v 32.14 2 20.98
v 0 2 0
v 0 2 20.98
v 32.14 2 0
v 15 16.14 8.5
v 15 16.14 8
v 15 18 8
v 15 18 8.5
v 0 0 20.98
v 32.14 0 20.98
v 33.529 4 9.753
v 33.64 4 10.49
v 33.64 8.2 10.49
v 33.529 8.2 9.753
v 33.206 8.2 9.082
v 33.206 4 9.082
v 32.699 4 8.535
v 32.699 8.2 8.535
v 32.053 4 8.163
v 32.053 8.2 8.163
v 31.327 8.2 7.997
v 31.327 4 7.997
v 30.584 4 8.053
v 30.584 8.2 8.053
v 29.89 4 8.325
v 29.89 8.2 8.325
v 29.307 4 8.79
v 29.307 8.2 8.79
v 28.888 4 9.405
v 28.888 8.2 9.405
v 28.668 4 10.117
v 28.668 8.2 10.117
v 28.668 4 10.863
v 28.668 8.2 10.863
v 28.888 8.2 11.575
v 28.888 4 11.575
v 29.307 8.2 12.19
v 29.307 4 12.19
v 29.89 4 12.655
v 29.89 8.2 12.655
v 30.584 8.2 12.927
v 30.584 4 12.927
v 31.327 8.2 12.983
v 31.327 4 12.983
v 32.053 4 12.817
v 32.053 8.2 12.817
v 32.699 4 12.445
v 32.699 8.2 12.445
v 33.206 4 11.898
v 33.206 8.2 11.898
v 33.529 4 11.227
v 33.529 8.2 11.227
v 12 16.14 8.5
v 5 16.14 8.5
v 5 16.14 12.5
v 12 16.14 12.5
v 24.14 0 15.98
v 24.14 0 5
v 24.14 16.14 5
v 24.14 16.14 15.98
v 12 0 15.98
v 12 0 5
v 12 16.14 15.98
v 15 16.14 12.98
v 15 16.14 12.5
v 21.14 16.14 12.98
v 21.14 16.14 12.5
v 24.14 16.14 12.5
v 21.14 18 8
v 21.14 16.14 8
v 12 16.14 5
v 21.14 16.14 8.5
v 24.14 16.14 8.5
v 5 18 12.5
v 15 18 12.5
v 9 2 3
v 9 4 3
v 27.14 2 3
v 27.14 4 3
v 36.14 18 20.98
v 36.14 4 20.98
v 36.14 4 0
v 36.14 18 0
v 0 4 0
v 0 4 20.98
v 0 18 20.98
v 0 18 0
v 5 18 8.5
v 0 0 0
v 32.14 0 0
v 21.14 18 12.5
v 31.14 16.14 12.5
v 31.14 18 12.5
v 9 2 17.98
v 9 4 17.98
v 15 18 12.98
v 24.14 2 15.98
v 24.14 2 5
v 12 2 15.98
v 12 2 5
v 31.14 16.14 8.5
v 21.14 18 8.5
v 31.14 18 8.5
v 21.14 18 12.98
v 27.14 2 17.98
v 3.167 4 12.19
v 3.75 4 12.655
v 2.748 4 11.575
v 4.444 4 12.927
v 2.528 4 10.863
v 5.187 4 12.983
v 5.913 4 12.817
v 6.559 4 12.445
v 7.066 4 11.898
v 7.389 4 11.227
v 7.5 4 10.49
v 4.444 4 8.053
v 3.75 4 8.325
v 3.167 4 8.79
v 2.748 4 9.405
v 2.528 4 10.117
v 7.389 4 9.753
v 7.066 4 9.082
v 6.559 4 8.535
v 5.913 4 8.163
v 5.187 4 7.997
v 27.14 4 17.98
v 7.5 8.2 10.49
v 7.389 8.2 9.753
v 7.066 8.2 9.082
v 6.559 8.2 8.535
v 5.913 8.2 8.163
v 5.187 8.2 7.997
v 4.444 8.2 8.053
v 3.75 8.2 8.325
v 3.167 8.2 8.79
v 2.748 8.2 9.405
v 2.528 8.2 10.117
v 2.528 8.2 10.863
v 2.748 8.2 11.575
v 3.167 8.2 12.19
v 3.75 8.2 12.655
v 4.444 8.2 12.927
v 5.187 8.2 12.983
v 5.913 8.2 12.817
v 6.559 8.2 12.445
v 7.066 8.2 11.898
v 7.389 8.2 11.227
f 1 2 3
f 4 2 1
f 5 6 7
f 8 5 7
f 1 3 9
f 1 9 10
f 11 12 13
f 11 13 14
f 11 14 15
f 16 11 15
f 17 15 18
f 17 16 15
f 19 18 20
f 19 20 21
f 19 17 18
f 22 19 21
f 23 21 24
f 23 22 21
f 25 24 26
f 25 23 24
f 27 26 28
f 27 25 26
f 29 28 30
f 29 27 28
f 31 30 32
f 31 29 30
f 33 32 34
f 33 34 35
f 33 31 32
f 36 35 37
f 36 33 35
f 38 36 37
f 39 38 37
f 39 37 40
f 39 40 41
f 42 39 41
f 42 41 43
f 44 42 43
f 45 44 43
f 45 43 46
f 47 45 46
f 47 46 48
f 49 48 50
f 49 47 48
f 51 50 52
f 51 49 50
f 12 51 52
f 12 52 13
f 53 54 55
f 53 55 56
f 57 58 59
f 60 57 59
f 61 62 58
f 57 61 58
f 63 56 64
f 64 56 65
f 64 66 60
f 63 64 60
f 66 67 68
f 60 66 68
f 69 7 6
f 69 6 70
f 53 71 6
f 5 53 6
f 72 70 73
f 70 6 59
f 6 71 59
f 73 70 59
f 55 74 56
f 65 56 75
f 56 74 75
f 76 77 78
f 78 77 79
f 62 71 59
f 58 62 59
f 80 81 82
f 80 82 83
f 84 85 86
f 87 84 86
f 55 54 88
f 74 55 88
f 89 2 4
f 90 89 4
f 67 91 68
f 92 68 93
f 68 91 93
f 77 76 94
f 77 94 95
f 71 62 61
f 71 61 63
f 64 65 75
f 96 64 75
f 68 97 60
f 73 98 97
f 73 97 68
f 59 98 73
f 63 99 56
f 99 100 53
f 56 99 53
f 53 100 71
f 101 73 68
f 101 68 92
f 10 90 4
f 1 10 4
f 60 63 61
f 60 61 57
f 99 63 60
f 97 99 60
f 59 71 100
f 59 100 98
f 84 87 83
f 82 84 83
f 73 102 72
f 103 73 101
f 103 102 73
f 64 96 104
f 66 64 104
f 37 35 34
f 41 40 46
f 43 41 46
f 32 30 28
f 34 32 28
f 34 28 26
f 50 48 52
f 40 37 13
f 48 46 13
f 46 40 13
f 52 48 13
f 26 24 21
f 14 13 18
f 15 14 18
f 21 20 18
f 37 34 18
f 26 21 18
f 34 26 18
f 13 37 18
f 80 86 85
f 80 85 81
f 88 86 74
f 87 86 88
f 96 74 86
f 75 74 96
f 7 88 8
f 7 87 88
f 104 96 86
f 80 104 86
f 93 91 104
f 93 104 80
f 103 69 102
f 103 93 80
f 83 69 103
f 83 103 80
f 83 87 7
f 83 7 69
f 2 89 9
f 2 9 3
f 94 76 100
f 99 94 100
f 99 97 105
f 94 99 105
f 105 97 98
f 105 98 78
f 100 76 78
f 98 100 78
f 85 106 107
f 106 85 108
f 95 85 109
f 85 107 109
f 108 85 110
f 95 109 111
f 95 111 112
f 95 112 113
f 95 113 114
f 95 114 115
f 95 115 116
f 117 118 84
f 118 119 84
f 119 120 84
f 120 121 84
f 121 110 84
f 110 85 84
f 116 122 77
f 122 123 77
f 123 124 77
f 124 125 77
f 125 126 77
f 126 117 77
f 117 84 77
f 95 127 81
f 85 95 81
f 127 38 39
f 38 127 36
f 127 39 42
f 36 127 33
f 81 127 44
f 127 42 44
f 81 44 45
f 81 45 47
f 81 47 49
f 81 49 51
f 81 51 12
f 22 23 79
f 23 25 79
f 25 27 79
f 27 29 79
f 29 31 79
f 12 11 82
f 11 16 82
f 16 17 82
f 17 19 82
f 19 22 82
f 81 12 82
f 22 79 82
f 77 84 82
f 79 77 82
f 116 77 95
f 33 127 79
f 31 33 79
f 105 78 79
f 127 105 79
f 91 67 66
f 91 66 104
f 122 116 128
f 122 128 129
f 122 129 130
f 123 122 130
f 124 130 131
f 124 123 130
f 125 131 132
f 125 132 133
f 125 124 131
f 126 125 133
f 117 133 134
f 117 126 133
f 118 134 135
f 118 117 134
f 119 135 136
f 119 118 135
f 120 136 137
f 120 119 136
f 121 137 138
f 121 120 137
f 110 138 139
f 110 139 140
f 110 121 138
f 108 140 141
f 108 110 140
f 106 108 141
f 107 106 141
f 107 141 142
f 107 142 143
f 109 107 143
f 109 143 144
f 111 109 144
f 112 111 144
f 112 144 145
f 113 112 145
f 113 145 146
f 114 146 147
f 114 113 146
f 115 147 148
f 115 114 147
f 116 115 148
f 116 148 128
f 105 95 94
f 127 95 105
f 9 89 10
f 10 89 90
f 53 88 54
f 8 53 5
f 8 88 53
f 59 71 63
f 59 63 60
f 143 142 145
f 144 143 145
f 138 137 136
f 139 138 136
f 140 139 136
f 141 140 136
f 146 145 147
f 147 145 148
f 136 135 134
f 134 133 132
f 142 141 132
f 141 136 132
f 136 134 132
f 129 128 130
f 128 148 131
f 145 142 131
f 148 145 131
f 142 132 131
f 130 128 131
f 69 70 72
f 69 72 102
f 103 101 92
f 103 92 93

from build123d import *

# Parameters (mm, degrees)
BOX_W             = 12.14
BOX_H             = 16.14
BOX_DEPTH         = 10.98
BOX001_W          = 32.14
BOX001_H          = 2
BOX001_DEPTH      = 20.98
CYLINDER001_R     = 2.5
CYLINDER001_DEPTH = 4.2
CYLINDER_R        = 2.5
CYLINDER_DEPTH    = 4.2
BOX007_W          = 18.14
BOX007_H          = 4
BOX007_DEPTH      = 14.98
BOX006_W          = 36.14
BOX006_H          = 4
BOX006_DEPTH      = 20.98
BOX004_W          = 26.14
BOX004_H          = 10
BOX004_DEPTH      = 4
BOX003_W          = 6.14
BOX003_H          = 10
BOX003_DEPTH      = 4.98
BOX005_W          = 12.14
BOX005_H          = 16.14
BOX005_DEPTH      = 10.98
BOX002_W          = 36.14
BOX002_H          = 16
BOX002_DEPTH      = 20.98


with BuildPart() as usb:
    # Box → Box (new body)
    with BuildSketch(Plane(origin=(12, 0, 5), x_dir=(1, 0, 0), z_dir=(0, 0, 1))):
        with Locations((6.07, 8.07)):
            Rectangle(BOX_W, BOX_H)
    extrude(amount=BOX_DEPTH)


with BuildPart() as panel:
    # Box001 → Box001 (new body)
    with BuildSketch(Plane.XY):
        with Locations((16.07, 1)):
            Rectangle(BOX001_W, BOX001_H)
    extrude(amount=BOX001_DEPTH)


with BuildPart() as cylinder001:
    # Cylinder001 → Cylinder001 (new body)
    with BuildSketch(Plane(origin=(31.14, 4, 10.49), x_dir=(1, 0, 0), z_dir=(0, 1, 0))):
        Circle(CYLINDER001_R)
    extrude(amount=CYLINDER001_DEPTH)


with BuildPart() as cylinder:
    # Cylinder → Cylinder (new body)
    with BuildSketch(Plane(origin=(5, 4, 10.49), x_dir=(1, 0, 0), z_dir=(0, 1, 0))):
        Circle(CYLINDER_R)
    extrude(amount=CYLINDER_DEPTH)


with BuildPart() as cube005:
    # Box007 → Box007 (new body)
    with BuildSketch(Plane(origin=(9, 0, 3), x_dir=(1, 0, 0), z_dir=(0, 0, 1))):
        with Locations((9.07, 2)):
            Rectangle(BOX007_W, BOX007_H)
    extrude(amount=BOX007_DEPTH)


with BuildPart() as cut003:
    # Box006 → Box006 (new body)
    with BuildSketch(Plane.XY):
        with Locations((18.07, 2)):
            Rectangle(BOX006_W, BOX006_H)
    extrude(amount=BOX006_DEPTH)

    # Cut003: cut Cube005
    add(cube005.part, mode=Mode.SUBTRACT)


with BuildPart() as cube003:
    # Box004 → Box004 (new body)
    with BuildSketch(Plane(origin=(5, 16.14, 8.5), x_dir=(1, 0, 0), z_dir=(0, 0, 1))):
        with Locations((13.07, 5)):
            Rectangle(BOX004_W, BOX004_H)
    extrude(amount=BOX004_DEPTH)


with BuildPart() as cube002:
    # Box003 → Box003 (new body)
    with BuildSketch(Plane(origin=(15, 16.14, 8), x_dir=(1, 0, 0), z_dir=(0, 0, 1))):
        with Locations((3.07, 5)):
            Rectangle(BOX003_W, BOX003_H)
    extrude(amount=BOX003_DEPTH)


with BuildPart() as cube004:
    # Box005 → Box005 (new body)
    with BuildSketch(Plane(origin=(12, 0, 5), x_dir=(1, 0, 0), z_dir=(0, 0, 1))):
        with Locations((6.07, 8.07)):
            Rectangle(BOX005_W, BOX005_H)
    extrude(amount=BOX005_DEPTH)


with BuildPart() as cut006:
    # Box002 → Box002 (new body)
    with BuildSketch(Plane(origin=(0, 2, 0), x_dir=(1, 0, 0), z_dir=(0, 0, 1))):
        with Locations((18.07, 8)):
            Rectangle(BOX002_W, BOX002_H)
    extrude(amount=BOX002_DEPTH)

    # Cut: cut Cube004
    add(cube004.part, mode=Mode.SUBTRACT)

    # Cut001: cut Cube002
    add(cube002.part, mode=Mode.SUBTRACT)

    # Cut002: cut Cube003
    add(cube003.part, mode=Mode.SUBTRACT)

    # Cut004: cut Cut003
    add(cut003.part, mode=Mode.SUBTRACT)

    # Cut005: cut Cylinder
    add(cylinder.part, mode=Mode.SUBTRACT)

    # Cut006: cut Cylinder001
    add(cylinder001.part, mode=Mode.SUBTRACT)


solid = Compound([usb.part, panel.part, cut006.part])
